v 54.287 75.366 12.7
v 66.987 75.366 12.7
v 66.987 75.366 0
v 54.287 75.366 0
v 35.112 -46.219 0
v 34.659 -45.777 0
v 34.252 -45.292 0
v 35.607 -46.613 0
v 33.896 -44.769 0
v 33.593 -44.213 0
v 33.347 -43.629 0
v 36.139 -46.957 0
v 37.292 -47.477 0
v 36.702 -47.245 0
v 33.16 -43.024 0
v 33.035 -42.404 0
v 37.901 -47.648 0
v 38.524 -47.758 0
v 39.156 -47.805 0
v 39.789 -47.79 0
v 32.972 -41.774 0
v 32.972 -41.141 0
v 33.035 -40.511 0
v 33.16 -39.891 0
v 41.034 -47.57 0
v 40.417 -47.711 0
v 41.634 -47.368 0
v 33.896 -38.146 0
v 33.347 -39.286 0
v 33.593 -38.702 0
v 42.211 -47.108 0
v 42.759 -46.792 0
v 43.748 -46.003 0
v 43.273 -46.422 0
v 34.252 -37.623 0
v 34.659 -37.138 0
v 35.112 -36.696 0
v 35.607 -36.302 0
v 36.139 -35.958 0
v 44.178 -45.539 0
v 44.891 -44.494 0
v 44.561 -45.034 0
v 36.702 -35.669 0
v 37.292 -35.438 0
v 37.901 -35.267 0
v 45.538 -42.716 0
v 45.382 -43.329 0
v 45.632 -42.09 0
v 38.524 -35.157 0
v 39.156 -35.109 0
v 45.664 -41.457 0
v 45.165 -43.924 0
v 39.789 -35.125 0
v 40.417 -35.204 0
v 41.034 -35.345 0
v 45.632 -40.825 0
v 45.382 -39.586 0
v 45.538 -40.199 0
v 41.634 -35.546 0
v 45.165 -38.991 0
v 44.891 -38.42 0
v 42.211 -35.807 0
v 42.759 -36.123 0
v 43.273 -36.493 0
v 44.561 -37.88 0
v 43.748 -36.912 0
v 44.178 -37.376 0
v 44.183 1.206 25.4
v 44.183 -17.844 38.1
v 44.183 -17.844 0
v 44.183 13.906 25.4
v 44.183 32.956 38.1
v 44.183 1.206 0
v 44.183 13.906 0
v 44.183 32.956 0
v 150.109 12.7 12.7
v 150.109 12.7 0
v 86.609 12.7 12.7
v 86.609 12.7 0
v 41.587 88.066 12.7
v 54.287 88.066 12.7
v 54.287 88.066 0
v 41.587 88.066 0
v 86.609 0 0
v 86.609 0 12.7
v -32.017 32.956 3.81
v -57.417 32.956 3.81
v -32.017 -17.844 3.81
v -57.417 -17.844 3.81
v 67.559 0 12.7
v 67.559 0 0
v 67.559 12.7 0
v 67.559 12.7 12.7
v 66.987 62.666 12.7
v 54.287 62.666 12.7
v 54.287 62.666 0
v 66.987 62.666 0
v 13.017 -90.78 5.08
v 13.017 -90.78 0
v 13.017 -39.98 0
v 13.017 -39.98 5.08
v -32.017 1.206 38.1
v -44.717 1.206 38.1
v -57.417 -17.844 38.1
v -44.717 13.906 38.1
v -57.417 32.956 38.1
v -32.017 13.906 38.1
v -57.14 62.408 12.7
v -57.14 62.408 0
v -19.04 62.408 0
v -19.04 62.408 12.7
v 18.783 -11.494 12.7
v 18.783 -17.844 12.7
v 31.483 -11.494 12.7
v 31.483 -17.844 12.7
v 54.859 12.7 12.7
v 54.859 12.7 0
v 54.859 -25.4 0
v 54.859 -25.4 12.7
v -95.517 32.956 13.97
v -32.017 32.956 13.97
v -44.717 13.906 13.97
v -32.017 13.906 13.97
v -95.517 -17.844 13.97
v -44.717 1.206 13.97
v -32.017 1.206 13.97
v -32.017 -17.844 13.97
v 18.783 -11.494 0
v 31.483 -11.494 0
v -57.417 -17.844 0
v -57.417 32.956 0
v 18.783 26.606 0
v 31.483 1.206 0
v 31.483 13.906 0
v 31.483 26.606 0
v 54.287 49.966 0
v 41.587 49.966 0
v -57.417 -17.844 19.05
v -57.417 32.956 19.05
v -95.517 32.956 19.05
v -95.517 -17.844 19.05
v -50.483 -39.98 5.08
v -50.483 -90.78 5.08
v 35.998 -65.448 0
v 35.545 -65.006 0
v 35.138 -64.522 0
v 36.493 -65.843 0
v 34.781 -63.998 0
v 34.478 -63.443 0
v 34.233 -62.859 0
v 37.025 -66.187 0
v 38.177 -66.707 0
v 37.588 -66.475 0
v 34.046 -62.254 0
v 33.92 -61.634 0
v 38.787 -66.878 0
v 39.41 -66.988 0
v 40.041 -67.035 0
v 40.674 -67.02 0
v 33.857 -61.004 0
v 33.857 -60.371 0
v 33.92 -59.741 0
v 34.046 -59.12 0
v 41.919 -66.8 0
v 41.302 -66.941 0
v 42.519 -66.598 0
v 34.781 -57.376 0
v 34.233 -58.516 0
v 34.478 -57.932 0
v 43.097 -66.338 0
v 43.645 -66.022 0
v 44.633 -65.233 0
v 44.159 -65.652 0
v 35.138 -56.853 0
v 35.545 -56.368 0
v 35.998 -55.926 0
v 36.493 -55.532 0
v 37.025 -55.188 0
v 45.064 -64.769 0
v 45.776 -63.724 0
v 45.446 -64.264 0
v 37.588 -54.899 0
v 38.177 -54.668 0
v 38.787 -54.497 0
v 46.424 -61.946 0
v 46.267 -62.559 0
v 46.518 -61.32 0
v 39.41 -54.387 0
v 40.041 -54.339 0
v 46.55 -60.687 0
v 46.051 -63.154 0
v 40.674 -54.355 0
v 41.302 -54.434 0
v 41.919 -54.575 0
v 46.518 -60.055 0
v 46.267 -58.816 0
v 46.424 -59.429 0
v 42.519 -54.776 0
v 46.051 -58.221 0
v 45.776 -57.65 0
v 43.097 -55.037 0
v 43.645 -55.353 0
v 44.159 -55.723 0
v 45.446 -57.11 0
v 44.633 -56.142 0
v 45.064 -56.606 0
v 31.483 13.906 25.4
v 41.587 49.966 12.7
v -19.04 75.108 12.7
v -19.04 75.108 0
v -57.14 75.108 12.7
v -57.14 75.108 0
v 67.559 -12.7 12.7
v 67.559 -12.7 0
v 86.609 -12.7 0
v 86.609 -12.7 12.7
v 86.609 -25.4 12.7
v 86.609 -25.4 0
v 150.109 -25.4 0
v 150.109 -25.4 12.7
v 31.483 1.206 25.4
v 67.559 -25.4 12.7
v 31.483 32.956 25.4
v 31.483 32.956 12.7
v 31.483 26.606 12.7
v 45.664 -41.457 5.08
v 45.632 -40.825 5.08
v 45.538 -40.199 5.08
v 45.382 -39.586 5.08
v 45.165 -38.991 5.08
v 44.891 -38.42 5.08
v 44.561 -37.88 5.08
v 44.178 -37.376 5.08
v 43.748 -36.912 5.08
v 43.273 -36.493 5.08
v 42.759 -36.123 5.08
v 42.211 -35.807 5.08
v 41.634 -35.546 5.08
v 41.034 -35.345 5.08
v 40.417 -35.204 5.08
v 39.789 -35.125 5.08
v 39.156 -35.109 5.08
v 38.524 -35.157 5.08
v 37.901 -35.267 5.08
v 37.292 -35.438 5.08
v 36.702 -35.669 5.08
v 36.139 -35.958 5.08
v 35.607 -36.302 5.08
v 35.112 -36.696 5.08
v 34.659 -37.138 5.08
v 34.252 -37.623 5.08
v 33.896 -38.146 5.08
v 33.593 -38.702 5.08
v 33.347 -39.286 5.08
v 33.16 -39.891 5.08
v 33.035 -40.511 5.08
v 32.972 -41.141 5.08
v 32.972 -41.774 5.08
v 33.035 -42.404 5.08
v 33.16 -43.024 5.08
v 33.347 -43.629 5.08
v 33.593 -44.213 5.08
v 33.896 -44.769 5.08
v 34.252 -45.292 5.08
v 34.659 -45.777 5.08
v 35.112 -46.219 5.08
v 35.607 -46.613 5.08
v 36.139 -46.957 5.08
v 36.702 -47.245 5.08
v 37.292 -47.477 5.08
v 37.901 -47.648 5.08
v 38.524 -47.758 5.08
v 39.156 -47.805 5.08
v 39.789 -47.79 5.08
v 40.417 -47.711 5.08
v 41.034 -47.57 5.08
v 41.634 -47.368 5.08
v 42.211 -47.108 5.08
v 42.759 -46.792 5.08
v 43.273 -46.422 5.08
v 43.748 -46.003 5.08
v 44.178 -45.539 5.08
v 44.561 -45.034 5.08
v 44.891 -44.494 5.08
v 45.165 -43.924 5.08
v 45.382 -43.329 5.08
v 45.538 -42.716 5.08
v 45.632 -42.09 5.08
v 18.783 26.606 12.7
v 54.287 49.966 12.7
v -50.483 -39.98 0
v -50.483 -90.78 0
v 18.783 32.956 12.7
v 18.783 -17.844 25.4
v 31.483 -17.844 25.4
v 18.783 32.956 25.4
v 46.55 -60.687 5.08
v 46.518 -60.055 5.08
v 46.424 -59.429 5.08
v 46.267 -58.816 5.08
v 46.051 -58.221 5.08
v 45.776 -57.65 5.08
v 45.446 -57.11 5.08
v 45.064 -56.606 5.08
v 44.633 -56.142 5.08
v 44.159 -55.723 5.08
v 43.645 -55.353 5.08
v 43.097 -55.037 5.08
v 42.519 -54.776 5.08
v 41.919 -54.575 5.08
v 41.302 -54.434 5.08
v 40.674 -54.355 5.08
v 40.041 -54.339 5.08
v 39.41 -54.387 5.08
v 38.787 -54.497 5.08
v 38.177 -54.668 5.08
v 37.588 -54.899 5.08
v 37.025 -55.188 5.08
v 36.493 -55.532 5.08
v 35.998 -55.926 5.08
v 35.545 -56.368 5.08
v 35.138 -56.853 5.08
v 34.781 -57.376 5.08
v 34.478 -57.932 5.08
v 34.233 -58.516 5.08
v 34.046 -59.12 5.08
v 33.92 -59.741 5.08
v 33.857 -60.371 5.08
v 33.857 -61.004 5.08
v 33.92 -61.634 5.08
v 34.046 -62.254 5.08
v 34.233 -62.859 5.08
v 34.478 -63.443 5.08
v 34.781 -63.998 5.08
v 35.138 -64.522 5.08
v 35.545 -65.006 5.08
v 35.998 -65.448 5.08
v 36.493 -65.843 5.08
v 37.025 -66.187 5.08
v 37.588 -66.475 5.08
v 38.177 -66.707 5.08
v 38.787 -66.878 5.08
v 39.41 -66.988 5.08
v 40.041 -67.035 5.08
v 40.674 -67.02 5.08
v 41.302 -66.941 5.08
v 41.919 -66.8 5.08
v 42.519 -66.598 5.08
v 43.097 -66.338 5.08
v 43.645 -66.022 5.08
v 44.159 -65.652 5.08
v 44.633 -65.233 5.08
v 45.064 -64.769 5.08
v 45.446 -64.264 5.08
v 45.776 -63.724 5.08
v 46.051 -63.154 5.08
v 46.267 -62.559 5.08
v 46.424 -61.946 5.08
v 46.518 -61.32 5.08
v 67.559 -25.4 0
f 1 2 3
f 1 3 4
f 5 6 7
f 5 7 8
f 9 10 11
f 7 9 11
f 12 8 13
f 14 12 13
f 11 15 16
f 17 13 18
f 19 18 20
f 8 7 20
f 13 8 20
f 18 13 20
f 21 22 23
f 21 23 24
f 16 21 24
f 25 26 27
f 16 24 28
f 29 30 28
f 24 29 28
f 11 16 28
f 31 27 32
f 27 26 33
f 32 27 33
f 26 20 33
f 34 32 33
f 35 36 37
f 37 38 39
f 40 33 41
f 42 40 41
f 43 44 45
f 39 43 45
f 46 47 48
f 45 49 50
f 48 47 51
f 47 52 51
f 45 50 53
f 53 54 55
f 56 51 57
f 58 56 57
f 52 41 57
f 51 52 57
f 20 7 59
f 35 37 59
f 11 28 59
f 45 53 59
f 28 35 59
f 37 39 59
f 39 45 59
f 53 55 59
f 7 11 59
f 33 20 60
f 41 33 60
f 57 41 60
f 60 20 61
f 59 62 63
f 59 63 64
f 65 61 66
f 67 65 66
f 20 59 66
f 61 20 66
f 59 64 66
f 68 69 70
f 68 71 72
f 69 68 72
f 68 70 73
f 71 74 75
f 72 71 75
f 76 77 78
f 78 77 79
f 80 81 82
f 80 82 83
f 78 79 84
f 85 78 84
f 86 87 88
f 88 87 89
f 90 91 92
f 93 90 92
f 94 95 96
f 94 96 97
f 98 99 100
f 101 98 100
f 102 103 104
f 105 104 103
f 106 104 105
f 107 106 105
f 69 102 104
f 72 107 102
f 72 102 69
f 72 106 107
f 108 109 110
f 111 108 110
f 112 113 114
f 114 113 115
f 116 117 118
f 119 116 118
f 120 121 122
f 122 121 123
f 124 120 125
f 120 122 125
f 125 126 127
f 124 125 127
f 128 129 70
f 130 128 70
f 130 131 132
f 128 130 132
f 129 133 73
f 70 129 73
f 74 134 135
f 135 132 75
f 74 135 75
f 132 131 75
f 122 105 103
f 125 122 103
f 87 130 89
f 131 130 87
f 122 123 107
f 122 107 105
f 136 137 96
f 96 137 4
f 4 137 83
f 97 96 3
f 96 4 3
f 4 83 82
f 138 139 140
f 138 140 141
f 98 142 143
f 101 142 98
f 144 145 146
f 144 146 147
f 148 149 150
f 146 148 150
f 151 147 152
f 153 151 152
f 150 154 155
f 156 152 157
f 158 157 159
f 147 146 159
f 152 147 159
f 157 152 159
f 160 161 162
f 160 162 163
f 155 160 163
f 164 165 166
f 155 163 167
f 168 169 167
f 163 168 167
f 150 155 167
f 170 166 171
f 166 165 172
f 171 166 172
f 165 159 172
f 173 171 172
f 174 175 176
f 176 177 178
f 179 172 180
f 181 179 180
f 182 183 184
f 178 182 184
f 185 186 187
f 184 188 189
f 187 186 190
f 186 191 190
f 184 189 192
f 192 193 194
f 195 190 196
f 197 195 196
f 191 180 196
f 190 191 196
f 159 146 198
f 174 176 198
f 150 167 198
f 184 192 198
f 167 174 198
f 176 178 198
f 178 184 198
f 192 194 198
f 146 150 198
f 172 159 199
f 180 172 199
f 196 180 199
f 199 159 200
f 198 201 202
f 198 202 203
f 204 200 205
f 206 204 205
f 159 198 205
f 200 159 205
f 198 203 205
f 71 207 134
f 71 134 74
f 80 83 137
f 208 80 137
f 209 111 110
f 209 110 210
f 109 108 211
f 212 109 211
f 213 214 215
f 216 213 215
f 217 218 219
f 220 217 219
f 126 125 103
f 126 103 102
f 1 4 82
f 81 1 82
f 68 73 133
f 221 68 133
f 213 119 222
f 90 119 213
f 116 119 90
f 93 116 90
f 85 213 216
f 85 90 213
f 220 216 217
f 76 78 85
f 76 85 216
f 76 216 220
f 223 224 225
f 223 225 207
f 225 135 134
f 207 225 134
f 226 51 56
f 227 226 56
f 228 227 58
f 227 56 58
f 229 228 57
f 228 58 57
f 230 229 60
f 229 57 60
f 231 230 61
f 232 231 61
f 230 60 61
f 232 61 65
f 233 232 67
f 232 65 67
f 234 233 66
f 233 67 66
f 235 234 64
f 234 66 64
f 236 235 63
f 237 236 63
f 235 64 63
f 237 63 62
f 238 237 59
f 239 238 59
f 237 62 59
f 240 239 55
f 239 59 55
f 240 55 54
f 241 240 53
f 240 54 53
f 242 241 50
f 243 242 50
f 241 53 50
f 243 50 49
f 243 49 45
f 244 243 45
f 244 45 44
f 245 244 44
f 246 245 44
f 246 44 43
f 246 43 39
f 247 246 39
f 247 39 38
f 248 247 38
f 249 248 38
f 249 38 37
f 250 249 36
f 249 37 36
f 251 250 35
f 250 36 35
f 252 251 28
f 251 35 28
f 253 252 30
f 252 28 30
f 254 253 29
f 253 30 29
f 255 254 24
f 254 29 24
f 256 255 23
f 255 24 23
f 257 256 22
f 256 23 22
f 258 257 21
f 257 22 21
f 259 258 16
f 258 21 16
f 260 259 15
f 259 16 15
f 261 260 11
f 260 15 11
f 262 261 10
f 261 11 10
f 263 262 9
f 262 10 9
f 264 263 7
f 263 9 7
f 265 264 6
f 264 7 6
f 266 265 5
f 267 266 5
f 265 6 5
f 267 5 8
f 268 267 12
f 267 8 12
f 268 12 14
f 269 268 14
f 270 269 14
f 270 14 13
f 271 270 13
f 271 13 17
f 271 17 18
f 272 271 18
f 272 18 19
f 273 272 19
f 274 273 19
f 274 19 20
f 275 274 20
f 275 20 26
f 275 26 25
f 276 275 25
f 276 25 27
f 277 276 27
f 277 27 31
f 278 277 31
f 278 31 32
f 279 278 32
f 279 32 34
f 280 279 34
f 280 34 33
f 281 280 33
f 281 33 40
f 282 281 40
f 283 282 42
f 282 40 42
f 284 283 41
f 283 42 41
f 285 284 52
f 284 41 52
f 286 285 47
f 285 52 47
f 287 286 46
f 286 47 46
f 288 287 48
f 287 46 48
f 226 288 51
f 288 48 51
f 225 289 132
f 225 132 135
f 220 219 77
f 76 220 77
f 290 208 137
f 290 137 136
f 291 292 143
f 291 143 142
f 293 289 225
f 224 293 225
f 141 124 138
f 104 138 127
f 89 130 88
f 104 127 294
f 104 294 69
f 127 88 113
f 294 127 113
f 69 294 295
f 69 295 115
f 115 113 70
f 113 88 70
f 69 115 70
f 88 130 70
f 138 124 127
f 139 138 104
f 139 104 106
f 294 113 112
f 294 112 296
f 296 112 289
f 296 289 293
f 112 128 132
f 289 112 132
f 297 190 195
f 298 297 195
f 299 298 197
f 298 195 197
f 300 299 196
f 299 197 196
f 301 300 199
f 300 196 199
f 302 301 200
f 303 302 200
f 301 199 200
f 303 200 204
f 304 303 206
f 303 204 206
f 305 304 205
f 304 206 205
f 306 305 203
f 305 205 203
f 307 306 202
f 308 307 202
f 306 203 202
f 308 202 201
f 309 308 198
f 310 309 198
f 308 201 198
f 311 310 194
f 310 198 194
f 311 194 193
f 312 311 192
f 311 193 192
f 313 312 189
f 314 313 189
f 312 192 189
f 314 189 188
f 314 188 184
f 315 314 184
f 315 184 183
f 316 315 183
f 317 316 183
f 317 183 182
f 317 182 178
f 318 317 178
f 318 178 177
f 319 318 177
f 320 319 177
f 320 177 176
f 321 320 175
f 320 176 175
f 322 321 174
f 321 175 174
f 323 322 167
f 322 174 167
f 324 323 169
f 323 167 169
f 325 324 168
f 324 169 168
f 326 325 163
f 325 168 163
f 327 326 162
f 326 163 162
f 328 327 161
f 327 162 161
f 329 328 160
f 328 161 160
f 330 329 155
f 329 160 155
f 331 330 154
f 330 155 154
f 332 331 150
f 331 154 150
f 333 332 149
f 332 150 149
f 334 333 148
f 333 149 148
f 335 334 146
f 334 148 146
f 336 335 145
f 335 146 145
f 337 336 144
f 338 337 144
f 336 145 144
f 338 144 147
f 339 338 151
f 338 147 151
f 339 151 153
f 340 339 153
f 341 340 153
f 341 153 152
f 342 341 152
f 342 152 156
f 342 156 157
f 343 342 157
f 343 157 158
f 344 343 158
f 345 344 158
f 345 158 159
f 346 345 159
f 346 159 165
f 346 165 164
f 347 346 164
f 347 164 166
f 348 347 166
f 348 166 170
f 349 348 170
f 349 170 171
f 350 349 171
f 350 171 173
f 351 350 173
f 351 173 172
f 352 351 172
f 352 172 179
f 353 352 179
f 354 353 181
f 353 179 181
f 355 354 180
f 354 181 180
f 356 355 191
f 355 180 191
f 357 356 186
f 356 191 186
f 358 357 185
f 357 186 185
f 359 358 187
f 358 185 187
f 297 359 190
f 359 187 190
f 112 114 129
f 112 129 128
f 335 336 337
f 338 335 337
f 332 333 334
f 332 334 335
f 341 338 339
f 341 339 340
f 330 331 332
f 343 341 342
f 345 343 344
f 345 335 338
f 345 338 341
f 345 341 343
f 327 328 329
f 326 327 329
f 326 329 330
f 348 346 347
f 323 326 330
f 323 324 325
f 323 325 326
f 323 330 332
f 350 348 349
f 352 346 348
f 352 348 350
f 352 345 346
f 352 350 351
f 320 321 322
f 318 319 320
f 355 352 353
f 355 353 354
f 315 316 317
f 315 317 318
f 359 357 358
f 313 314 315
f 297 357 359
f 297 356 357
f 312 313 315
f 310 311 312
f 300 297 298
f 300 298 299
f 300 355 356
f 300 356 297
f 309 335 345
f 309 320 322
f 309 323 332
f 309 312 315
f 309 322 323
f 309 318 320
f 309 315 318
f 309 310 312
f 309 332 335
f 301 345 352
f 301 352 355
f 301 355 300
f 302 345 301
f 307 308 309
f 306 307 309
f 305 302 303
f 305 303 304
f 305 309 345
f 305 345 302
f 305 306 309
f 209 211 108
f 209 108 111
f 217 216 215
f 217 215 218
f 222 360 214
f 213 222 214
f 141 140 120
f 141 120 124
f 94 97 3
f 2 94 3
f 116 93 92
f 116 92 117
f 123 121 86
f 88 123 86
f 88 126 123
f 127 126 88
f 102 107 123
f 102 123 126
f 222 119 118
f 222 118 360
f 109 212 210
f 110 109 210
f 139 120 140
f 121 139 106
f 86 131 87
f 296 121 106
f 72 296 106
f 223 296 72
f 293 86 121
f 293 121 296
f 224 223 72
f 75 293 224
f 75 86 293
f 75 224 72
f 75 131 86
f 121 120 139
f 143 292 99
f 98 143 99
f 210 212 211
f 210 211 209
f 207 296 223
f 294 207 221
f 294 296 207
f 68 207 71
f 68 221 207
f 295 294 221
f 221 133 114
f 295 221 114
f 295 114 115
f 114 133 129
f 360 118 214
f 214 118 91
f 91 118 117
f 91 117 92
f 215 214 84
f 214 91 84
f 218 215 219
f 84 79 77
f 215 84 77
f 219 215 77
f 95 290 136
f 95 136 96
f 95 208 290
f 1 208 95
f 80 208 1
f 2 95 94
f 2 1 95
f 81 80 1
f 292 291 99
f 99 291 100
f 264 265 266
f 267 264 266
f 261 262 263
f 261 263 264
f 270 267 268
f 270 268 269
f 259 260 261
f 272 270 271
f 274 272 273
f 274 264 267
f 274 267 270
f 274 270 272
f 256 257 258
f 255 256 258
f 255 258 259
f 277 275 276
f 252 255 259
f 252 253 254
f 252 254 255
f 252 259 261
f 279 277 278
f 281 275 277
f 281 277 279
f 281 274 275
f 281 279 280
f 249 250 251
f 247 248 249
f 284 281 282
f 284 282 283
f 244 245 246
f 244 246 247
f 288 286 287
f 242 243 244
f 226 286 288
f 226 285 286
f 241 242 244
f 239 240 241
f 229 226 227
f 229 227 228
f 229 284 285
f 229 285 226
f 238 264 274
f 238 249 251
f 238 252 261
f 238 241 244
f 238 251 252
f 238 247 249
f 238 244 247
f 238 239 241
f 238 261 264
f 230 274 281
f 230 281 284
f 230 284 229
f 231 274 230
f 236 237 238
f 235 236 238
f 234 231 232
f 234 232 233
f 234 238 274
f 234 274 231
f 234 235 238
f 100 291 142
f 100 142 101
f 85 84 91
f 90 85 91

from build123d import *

# Parameters (mm, degrees)
F0_W      = 101.6
F0_H      = 50.8
F1_DEPTH  = 38.1
F2_W      = 50.8
F2_H      = 5.08
F3_DEPTH  = 38.1
F5_DEPTH  = 25.4
F6_W      = 12.7
F6_H      = 12.7
F7_DEPTH  = 254
F9_DEPTH  = 31.75
F10_W     = 50.8
F10_H     = 10.16
F11_DEPTH = 25.4
F12_W     = 38.1
F12_H     = 12.7
F13_DEPTH = 12.7
F14_W     = 63.5
F14_H     = 50.8
F15_DEPTH = 5.08
F17_DEPTH = 12.7
F19_DEPTH = 12.7
F20_R     = 6.35
F21_DEPTH = 5.08


with BuildPart() as f1:
    # F0 (on Top) → F1 (new body)
    with BuildSketch(Plane.XY):
        with Locations((-6.617251, 7.556044)):
            Rectangle(F0_W, F0_H)
    extrude(amount=F1_DEPTH)

    # F2 (on face) → F3 (join)
    with BuildSketch(Plane(origin=(-57.417251, 0, 0), x_dir=(0, -1, 0), z_dir=(-1, 0, 0))):
        with Locations((-7.556044, 16.51)):
            Rectangle(F2_W, F2_H)
    extrude(amount=F3_DEPTH)

    # F4 (on face) → F5 (cut)
    with BuildSketch(Plane(origin=(0, 0, 0), x_dir=(1, 0, 0), z_dir=(0, 0, -1))):
        Polygon((44.182749, -13.906044), (44.182749, -1.206044), (31.482749, -1.206044), (31.482749, 11.493956), (18.782749, 11.493956), (18.782749, -1.206044), (18.782749, -13.906044), (18.782749, -26.606044), (31.482749, -26.606044), (31.482749, -13.906044), align=None)
    extrude(amount=-F5_DEPTH, mode=Mode.SUBTRACT)

    # F6 (on face) → F7 (cut)
    with BuildSketch(Plane.XZ.offset(17.843956)):
        with Locations((25.132749, 19.05)):
            Rectangle(F6_W, F6_H)
    extrude(amount=-F7_DEPTH, mode=Mode.SUBTRACT)

    # F8 (on face) → F9 (cut)
    with BuildSketch(Plane.XY.offset(38.1)):
        Polygon((-44.717251, 13.906044), (-44.717251, 7.556044), (-44.717251, 1.206044), (-32.017251, 1.206044), (-32.017251, 13.906044), align=None)
    extrude(amount=-F9_DEPTH, mode=Mode.SUBTRACT)

    # F10 (on face) → F11 (cut)
    with BuildSketch(Plane(origin=(-57.417251, 0, 0), x_dir=(0, -1, 0), z_dir=(-1, 0, 0))):
        with Locations((-7.556044, 8.89)):
            Rectangle(F10_W, F10_H)
    extrude(amount=-F11_DEPTH, mode=Mode.SUBTRACT)


with BuildPart() as f13:
    # F12 (on Top) → F13 (new body)
    with BuildSketch(Plane.XY):
        with Locations((-38.089881, 68.758216)):
            Rectangle(F12_W, F12_H)
    extrude(amount=F13_DEPTH)


with BuildPart() as f15:
    # F14 (on Top) → F15 (new body)
    with BuildSketch(Plane.XY):
        with Locations((-18.732918, -65.380015)):
            Rectangle(F14_W, F14_H)
    extrude(amount=F15_DEPTH)


with BuildPart() as f17:
    # F16 (on Top) → F17 (new body)
    with BuildSketch(Plane.XY):
        Polygon((54.858658, 12.7), (54.858658, -25.4), (67.558658, -25.4), (67.558658, -12.7), (86.608658, -12.7), (86.608658, -25.4), (150.108658, -25.4), (150.108658, 12.7), (86.608658, 12.7), (86.608658, 0), (67.558658, 0), (67.558658, 12.7), align=None)
    extrude(amount=F17_DEPTH)


with BuildPart() as f19:
    # F18 (on Top) → F19 (new body)
    with BuildSketch(Plane.XY):
        Polygon((54.28679, 88.065836), (41.58679, 88.065836), (41.58679, 49.965836), (54.28679, 49.965836), (54.28679, 62.665836), (66.98679, 62.665836), (66.98679, 75.365836), (54.28679, 75.365836), align=None)
    extrude(amount=F19_DEPTH)


with BuildPart() as f21:
    # F20 (on Top) → F21 (new body)
    with BuildSketch(Plane.XY):
        with Locations((39.313983, -41.457411)):
            Circle(F20_R)
        with Locations((40.19957, -60.687345)):
            Circle(F20_R)
    extrude(amount=F21_DEPTH)


solid = Compound([f1.part, f13.part, f15.part, f17.part, f19.part, f21.part])
